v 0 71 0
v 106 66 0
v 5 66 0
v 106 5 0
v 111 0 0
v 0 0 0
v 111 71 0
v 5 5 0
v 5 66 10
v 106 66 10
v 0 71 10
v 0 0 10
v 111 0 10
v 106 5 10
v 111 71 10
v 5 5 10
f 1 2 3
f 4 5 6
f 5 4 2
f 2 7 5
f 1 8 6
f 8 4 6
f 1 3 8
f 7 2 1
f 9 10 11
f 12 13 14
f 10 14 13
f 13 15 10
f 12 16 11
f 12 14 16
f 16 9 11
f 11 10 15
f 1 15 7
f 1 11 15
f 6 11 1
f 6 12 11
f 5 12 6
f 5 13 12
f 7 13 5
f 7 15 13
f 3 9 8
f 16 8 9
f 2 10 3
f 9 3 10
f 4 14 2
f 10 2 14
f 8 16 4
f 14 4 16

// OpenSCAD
// file: pipe.scad
// Function to create a rectangular frame with Z-height
module rectangular_frame(outer_width, outer_height, frame_width, z_height) {
    // Calculate inner dimensions
    inner_width = outer_width - 2 * frame_width;
    inner_height = outer_height - 2 * frame_width;

    // Extrude the 2D frame into 3D
    linear_extrude(height = z_height) {
        difference() {
            square([outer_width, outer_height]);
            translate([frame_width, frame_width])
                square([inner_width, inner_height]);
        }
    }
}

// Example usage
//rectangular_frame(100, 60, 3, 10); // 100x60mm outer size, 3mm frame width, 5mm Z-height
// main file
// Include the rectangular_frame module
include <pipe.scad>;

// Define the hole size
hole_width = 100;
hole_height = 60;
frame_width = 5; // Thickness of the rectangle around the hole

// Calculate outer dimensions
outer_width = 1 + hole_width + 2 * frame_width;
outer_height = 1 + hole_height + 2 * frame_width;

// Render the rectangle with a hole
rectangular_frame(outer_width, outer_height, frame_width, 10); // Z-height = 5mm
